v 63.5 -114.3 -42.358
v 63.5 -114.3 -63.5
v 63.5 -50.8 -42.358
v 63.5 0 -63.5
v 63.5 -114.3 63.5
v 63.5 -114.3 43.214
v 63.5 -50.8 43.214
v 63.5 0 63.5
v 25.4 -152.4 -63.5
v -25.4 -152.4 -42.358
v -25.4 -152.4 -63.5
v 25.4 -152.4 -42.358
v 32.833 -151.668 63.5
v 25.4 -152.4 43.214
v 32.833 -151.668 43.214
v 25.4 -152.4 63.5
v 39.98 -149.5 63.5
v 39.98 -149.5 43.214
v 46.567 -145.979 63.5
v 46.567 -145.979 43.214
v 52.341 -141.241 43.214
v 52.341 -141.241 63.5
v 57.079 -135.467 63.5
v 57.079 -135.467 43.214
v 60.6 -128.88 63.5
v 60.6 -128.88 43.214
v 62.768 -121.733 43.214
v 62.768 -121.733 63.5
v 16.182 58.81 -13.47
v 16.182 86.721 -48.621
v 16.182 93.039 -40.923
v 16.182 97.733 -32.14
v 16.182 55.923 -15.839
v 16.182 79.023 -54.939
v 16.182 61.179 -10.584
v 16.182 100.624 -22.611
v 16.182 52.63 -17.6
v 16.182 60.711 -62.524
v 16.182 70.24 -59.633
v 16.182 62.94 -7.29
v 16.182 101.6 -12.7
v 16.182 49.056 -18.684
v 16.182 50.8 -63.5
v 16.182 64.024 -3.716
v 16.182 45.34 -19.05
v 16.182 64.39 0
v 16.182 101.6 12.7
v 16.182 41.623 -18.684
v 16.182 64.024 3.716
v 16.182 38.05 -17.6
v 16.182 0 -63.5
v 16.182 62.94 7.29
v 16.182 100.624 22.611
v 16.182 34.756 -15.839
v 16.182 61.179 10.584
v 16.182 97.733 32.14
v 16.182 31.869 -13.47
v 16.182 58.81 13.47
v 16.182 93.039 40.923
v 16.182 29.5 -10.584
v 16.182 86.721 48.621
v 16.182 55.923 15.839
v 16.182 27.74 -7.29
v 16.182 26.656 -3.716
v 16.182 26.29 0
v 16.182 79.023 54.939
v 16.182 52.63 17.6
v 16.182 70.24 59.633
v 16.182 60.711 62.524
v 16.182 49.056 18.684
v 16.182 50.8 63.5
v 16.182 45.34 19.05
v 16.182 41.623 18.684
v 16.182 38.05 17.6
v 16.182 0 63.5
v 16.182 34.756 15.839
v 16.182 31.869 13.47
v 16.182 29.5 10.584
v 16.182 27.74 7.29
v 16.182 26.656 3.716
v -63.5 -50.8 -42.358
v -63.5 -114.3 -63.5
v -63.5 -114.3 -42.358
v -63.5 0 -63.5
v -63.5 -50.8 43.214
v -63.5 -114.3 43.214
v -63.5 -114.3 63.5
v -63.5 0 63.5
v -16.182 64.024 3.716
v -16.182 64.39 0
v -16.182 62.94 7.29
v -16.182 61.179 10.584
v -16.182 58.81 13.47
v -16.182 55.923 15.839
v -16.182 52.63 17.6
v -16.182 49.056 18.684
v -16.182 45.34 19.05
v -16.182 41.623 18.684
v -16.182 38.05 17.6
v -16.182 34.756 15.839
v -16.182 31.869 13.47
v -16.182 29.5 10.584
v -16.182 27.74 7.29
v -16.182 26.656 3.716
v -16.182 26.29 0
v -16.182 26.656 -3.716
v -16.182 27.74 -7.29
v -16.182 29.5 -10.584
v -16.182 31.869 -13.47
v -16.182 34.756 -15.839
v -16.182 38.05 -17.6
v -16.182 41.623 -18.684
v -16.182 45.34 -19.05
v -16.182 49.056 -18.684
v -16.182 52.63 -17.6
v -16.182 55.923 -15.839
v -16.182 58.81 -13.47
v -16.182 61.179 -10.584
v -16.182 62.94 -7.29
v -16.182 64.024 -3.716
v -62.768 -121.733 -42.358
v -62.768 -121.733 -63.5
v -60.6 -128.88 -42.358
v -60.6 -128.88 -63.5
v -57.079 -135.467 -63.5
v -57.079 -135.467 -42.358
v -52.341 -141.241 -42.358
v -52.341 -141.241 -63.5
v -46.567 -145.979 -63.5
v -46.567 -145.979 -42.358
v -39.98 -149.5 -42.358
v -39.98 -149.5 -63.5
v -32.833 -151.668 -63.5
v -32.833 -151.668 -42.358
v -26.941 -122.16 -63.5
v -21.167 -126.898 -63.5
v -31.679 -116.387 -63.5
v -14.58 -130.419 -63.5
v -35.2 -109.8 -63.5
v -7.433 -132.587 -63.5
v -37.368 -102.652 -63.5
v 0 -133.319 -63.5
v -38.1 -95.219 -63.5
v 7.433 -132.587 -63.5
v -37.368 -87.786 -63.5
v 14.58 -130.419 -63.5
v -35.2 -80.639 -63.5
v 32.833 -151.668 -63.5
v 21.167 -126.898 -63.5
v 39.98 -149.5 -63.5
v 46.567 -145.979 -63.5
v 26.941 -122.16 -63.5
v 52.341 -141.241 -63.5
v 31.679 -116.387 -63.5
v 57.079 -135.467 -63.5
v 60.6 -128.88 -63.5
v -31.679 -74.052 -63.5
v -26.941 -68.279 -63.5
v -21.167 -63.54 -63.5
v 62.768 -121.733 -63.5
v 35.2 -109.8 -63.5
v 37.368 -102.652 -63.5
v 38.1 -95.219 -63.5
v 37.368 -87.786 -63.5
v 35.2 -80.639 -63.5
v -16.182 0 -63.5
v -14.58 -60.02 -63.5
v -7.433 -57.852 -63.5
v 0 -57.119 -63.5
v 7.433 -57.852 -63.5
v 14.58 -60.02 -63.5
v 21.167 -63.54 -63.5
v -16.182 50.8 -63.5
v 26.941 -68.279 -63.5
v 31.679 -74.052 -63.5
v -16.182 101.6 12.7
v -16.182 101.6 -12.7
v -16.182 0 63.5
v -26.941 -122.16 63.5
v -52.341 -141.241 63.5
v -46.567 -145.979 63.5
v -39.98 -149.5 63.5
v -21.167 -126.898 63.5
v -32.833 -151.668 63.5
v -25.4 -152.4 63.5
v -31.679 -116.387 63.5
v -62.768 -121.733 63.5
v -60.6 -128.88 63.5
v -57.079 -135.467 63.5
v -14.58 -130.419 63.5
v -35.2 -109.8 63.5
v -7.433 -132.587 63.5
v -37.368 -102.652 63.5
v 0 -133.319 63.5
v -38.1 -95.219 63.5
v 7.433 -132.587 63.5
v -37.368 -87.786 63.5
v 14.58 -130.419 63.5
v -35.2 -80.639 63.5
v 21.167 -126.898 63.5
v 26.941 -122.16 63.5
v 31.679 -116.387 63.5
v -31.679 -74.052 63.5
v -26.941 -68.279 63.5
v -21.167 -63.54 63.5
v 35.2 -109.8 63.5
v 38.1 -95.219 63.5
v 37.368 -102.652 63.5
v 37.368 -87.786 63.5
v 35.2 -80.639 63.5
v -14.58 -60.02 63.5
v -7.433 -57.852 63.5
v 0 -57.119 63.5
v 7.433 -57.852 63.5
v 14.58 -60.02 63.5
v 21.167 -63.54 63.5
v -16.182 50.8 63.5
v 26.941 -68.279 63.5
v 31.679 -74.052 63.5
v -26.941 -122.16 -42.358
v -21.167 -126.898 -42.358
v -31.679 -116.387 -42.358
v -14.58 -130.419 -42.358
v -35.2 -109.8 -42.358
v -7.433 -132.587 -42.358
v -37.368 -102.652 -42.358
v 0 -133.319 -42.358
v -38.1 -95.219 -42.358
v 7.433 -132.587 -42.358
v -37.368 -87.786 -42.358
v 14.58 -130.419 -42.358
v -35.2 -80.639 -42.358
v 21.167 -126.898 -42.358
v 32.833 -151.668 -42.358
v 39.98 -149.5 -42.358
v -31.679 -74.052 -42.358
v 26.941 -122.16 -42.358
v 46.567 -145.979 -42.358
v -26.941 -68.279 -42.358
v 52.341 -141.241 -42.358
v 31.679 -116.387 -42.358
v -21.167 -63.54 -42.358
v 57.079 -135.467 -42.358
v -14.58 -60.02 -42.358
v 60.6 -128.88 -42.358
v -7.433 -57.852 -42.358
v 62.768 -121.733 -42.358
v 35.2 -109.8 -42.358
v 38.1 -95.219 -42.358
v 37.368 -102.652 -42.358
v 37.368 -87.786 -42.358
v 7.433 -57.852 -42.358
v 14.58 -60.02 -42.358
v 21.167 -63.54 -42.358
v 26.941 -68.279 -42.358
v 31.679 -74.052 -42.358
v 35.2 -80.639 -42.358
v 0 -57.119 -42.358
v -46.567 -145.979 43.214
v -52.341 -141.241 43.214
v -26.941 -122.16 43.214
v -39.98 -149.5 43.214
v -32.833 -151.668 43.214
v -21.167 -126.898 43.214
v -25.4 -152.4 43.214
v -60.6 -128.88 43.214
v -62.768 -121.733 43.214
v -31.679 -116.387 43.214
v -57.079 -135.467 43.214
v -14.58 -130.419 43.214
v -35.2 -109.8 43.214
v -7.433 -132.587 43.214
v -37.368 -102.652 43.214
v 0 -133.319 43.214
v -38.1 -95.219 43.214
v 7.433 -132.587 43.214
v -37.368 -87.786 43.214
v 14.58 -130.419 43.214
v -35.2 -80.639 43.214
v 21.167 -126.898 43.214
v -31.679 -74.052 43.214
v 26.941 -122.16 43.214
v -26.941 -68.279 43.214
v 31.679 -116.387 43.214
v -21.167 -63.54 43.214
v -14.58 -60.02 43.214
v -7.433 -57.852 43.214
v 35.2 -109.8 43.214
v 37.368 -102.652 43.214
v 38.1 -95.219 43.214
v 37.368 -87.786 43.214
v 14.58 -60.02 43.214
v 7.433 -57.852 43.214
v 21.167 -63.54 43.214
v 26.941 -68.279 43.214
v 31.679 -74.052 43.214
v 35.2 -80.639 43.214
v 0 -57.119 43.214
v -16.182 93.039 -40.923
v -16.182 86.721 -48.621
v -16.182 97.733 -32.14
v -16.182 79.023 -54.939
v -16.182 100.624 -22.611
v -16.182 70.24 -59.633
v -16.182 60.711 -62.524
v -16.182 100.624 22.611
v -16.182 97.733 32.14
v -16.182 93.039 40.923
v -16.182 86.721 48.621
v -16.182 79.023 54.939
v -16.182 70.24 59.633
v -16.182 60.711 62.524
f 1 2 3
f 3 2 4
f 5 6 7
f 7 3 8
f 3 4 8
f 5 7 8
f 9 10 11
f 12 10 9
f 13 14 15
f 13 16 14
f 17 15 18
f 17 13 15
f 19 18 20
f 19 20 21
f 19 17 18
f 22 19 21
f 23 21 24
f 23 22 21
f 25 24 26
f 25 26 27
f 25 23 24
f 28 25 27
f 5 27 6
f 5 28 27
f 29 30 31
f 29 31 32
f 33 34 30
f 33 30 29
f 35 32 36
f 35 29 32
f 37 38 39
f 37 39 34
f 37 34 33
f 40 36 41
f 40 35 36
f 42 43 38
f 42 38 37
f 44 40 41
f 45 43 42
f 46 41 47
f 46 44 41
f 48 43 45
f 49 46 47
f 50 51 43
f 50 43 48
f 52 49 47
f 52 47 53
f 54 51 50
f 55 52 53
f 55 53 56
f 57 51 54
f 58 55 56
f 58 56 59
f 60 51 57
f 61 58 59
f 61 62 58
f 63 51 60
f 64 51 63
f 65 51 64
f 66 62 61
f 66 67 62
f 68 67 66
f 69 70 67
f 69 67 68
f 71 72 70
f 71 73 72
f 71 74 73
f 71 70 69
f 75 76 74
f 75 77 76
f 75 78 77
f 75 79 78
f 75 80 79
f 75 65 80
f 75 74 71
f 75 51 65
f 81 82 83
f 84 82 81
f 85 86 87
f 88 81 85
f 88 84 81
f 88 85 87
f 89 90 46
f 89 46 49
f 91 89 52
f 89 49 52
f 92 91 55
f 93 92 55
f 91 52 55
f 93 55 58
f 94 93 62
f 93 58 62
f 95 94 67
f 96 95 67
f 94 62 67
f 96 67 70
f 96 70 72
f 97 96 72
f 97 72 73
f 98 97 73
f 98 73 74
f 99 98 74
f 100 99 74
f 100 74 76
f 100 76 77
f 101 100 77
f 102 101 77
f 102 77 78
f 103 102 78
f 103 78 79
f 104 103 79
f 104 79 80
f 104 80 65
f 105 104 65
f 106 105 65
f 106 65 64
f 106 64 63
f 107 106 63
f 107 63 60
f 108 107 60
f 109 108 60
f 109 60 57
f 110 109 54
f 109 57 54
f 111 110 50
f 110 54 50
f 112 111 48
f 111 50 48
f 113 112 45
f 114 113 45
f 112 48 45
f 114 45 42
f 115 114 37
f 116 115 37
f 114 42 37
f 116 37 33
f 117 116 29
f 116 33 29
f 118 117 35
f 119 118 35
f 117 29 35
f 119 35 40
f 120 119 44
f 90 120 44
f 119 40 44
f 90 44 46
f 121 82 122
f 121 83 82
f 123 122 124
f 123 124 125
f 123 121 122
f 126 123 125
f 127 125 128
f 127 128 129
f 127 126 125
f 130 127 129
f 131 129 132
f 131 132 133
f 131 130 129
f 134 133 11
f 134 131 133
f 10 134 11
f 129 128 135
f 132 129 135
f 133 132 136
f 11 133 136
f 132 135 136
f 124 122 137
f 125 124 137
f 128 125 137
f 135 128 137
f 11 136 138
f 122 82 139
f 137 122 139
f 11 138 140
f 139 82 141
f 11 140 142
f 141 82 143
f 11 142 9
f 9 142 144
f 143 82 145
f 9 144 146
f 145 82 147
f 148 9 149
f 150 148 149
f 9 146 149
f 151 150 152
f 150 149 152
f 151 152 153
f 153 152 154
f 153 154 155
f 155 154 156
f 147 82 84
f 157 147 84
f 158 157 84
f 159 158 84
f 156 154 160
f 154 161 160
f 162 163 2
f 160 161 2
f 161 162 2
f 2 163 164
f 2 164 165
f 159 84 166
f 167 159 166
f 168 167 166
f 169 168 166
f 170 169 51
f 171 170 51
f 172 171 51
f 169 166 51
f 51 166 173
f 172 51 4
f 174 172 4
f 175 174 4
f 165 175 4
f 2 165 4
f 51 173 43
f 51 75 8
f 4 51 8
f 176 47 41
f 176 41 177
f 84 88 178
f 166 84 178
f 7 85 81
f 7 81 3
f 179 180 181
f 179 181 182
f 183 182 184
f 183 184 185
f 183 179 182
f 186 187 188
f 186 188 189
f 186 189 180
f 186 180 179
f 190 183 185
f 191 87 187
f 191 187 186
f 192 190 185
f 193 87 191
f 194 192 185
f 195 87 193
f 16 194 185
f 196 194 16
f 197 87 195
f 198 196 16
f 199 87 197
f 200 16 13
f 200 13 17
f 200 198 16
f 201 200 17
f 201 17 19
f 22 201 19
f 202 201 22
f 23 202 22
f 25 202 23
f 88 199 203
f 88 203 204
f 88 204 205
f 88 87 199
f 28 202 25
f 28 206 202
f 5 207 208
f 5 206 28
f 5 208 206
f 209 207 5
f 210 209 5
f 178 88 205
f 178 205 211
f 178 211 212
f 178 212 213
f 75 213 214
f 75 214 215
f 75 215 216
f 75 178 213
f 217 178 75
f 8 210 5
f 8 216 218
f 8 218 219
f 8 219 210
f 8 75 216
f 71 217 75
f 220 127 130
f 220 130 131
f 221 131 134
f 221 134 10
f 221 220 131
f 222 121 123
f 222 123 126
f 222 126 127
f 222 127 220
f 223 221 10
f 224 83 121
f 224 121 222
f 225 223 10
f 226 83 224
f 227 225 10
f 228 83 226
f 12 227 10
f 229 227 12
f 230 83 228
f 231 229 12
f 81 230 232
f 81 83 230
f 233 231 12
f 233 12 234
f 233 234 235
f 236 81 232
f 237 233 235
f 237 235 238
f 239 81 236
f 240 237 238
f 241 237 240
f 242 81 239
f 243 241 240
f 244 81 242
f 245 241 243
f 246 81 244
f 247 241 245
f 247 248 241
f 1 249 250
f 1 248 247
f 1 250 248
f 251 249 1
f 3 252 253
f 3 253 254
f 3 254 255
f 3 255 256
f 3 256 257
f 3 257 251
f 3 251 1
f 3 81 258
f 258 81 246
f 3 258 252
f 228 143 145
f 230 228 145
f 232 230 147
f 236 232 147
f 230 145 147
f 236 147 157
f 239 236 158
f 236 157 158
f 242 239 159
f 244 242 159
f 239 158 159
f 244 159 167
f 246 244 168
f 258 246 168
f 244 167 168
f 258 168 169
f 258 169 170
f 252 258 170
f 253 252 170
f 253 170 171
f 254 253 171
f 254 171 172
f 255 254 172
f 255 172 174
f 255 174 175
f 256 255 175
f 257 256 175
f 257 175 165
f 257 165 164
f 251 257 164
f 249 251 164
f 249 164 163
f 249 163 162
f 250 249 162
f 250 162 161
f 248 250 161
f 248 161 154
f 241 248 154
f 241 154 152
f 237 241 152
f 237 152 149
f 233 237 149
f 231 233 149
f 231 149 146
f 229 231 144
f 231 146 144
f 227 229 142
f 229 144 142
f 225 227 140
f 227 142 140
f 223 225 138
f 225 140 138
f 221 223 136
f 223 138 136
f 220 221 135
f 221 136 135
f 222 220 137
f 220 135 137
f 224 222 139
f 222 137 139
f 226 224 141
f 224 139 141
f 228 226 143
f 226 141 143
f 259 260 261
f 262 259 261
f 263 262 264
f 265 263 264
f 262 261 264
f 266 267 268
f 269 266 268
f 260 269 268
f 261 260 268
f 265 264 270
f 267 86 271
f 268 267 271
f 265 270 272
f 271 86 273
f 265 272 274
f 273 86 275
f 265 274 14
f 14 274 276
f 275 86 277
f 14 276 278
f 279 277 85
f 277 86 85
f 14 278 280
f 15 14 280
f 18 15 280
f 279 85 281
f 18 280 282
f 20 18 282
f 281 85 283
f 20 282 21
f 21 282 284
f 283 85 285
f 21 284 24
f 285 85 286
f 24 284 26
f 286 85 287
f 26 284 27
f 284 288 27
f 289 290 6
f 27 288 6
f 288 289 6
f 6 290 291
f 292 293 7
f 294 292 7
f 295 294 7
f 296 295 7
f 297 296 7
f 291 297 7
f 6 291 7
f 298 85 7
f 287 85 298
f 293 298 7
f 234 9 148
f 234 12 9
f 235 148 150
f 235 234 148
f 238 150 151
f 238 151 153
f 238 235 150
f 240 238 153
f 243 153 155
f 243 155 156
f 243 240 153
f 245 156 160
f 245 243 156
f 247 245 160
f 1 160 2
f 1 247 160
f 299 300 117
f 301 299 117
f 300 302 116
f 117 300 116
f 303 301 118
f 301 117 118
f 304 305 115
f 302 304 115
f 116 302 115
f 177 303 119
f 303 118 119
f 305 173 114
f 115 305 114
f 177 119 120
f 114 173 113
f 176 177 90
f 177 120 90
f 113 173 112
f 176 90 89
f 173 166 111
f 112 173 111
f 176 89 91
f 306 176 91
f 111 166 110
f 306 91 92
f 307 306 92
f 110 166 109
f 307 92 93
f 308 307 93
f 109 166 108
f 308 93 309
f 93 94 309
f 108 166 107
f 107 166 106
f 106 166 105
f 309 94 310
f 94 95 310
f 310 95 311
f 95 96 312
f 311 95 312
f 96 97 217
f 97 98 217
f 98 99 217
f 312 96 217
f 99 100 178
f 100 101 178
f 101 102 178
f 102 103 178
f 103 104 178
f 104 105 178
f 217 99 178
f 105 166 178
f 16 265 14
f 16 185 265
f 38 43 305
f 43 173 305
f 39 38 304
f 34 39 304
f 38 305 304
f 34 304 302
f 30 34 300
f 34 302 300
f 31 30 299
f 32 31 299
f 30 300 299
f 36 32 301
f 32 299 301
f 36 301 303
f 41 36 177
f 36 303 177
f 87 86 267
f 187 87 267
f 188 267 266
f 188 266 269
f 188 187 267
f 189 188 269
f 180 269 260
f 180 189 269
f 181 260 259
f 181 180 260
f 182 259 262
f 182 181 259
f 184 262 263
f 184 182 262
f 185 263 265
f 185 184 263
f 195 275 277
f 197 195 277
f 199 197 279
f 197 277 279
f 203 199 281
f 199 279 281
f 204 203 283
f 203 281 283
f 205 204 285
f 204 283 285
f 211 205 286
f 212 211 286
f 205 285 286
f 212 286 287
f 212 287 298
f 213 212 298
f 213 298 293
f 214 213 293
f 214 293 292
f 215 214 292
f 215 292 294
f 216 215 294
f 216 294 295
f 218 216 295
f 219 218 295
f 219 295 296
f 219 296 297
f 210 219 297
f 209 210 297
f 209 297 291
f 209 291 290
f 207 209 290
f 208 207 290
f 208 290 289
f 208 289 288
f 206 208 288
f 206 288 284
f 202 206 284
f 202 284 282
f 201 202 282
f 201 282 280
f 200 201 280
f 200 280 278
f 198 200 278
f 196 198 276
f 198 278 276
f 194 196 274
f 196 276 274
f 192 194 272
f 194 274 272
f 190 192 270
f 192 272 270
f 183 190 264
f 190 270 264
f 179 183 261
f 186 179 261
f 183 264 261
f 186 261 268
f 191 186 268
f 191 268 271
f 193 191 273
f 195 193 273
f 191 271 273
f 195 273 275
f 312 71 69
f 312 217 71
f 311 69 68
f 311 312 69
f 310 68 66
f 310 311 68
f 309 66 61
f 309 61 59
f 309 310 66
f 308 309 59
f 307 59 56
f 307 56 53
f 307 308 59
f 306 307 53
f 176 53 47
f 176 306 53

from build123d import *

# Parameters (mm, degrees)
F0_W     = 127
F0_H     = 127
F1_DEPTH = 50.8
F2_W     = 127
F2_H     = 20.286044
F2_H_2   = 21.141762
F3_DEPTH = 101.6
F5_D     = 76.2
F6_R     = 38.1
F7_W     = 32.363828
F7_H     = 127
F8_DEPTH = 101.6
F10_D    = 38.1
F11_R    = 50.8


with BuildPart() as f1:
    # F0 (on Front) → F1 (new body)
    with BuildSketch(Plane.XZ):
        Rectangle(F0_W, F0_H)
    extrude(amount=F1_DEPTH)

    # F2 (on face) → F3 (join)
    with BuildSketch(Plane.XZ.offset(50.8)):
        with Locations((0, 53.356978)):
            Rectangle(F2_W, F2_H)
        with Locations((0, -52.929119)):
            Rectangle(F2_W, F2_H_2)
    extrude(amount=F3_DEPTH)

    # F5 (through all)
    with Locations(Plane.XY.offset(63.5)):
        with Locations((0, -95.219441)):
            Hole(F5_D / 2)

    # F6
    f6_edges = [f1.edges().sort_by_distance(p)[0] for p in [
        (63.5, -152.4, 53.356978),
        (-63.5, -152.4, 53.356978),
        (63.5, -152.4, -52.929119),
        (-63.5, -152.4, -52.929119),
    ]]
    fillet(f6_edges, radius=F6_R)

    # F7 (on face) → F8 (join)
    with BuildSketch(Plane(origin=(0, 0, 0), x_dir=(-1, 0, 0), z_dir=(0, 1, 0))):
        Rectangle(F7_W, F7_H)
    extrude(amount=F8_DEPTH)

    # F10 (through all)
    with Locations(Plane(origin=(-16.181914, 0, 0), x_dir=(0, -1, 0), z_dir=(-1, 0, 0))):
        with Locations((-45.339677, 0)):
            Hole(F10_D / 2)

    # F11
    f11_edges = [f1.edges().sort_by_distance(p)[0] for p in [
        (0, 101.6, 63.5),
        (0, 101.6, -63.5),
    ]]
    fillet(f11_edges, radius=F11_R)


solid = f1.part
